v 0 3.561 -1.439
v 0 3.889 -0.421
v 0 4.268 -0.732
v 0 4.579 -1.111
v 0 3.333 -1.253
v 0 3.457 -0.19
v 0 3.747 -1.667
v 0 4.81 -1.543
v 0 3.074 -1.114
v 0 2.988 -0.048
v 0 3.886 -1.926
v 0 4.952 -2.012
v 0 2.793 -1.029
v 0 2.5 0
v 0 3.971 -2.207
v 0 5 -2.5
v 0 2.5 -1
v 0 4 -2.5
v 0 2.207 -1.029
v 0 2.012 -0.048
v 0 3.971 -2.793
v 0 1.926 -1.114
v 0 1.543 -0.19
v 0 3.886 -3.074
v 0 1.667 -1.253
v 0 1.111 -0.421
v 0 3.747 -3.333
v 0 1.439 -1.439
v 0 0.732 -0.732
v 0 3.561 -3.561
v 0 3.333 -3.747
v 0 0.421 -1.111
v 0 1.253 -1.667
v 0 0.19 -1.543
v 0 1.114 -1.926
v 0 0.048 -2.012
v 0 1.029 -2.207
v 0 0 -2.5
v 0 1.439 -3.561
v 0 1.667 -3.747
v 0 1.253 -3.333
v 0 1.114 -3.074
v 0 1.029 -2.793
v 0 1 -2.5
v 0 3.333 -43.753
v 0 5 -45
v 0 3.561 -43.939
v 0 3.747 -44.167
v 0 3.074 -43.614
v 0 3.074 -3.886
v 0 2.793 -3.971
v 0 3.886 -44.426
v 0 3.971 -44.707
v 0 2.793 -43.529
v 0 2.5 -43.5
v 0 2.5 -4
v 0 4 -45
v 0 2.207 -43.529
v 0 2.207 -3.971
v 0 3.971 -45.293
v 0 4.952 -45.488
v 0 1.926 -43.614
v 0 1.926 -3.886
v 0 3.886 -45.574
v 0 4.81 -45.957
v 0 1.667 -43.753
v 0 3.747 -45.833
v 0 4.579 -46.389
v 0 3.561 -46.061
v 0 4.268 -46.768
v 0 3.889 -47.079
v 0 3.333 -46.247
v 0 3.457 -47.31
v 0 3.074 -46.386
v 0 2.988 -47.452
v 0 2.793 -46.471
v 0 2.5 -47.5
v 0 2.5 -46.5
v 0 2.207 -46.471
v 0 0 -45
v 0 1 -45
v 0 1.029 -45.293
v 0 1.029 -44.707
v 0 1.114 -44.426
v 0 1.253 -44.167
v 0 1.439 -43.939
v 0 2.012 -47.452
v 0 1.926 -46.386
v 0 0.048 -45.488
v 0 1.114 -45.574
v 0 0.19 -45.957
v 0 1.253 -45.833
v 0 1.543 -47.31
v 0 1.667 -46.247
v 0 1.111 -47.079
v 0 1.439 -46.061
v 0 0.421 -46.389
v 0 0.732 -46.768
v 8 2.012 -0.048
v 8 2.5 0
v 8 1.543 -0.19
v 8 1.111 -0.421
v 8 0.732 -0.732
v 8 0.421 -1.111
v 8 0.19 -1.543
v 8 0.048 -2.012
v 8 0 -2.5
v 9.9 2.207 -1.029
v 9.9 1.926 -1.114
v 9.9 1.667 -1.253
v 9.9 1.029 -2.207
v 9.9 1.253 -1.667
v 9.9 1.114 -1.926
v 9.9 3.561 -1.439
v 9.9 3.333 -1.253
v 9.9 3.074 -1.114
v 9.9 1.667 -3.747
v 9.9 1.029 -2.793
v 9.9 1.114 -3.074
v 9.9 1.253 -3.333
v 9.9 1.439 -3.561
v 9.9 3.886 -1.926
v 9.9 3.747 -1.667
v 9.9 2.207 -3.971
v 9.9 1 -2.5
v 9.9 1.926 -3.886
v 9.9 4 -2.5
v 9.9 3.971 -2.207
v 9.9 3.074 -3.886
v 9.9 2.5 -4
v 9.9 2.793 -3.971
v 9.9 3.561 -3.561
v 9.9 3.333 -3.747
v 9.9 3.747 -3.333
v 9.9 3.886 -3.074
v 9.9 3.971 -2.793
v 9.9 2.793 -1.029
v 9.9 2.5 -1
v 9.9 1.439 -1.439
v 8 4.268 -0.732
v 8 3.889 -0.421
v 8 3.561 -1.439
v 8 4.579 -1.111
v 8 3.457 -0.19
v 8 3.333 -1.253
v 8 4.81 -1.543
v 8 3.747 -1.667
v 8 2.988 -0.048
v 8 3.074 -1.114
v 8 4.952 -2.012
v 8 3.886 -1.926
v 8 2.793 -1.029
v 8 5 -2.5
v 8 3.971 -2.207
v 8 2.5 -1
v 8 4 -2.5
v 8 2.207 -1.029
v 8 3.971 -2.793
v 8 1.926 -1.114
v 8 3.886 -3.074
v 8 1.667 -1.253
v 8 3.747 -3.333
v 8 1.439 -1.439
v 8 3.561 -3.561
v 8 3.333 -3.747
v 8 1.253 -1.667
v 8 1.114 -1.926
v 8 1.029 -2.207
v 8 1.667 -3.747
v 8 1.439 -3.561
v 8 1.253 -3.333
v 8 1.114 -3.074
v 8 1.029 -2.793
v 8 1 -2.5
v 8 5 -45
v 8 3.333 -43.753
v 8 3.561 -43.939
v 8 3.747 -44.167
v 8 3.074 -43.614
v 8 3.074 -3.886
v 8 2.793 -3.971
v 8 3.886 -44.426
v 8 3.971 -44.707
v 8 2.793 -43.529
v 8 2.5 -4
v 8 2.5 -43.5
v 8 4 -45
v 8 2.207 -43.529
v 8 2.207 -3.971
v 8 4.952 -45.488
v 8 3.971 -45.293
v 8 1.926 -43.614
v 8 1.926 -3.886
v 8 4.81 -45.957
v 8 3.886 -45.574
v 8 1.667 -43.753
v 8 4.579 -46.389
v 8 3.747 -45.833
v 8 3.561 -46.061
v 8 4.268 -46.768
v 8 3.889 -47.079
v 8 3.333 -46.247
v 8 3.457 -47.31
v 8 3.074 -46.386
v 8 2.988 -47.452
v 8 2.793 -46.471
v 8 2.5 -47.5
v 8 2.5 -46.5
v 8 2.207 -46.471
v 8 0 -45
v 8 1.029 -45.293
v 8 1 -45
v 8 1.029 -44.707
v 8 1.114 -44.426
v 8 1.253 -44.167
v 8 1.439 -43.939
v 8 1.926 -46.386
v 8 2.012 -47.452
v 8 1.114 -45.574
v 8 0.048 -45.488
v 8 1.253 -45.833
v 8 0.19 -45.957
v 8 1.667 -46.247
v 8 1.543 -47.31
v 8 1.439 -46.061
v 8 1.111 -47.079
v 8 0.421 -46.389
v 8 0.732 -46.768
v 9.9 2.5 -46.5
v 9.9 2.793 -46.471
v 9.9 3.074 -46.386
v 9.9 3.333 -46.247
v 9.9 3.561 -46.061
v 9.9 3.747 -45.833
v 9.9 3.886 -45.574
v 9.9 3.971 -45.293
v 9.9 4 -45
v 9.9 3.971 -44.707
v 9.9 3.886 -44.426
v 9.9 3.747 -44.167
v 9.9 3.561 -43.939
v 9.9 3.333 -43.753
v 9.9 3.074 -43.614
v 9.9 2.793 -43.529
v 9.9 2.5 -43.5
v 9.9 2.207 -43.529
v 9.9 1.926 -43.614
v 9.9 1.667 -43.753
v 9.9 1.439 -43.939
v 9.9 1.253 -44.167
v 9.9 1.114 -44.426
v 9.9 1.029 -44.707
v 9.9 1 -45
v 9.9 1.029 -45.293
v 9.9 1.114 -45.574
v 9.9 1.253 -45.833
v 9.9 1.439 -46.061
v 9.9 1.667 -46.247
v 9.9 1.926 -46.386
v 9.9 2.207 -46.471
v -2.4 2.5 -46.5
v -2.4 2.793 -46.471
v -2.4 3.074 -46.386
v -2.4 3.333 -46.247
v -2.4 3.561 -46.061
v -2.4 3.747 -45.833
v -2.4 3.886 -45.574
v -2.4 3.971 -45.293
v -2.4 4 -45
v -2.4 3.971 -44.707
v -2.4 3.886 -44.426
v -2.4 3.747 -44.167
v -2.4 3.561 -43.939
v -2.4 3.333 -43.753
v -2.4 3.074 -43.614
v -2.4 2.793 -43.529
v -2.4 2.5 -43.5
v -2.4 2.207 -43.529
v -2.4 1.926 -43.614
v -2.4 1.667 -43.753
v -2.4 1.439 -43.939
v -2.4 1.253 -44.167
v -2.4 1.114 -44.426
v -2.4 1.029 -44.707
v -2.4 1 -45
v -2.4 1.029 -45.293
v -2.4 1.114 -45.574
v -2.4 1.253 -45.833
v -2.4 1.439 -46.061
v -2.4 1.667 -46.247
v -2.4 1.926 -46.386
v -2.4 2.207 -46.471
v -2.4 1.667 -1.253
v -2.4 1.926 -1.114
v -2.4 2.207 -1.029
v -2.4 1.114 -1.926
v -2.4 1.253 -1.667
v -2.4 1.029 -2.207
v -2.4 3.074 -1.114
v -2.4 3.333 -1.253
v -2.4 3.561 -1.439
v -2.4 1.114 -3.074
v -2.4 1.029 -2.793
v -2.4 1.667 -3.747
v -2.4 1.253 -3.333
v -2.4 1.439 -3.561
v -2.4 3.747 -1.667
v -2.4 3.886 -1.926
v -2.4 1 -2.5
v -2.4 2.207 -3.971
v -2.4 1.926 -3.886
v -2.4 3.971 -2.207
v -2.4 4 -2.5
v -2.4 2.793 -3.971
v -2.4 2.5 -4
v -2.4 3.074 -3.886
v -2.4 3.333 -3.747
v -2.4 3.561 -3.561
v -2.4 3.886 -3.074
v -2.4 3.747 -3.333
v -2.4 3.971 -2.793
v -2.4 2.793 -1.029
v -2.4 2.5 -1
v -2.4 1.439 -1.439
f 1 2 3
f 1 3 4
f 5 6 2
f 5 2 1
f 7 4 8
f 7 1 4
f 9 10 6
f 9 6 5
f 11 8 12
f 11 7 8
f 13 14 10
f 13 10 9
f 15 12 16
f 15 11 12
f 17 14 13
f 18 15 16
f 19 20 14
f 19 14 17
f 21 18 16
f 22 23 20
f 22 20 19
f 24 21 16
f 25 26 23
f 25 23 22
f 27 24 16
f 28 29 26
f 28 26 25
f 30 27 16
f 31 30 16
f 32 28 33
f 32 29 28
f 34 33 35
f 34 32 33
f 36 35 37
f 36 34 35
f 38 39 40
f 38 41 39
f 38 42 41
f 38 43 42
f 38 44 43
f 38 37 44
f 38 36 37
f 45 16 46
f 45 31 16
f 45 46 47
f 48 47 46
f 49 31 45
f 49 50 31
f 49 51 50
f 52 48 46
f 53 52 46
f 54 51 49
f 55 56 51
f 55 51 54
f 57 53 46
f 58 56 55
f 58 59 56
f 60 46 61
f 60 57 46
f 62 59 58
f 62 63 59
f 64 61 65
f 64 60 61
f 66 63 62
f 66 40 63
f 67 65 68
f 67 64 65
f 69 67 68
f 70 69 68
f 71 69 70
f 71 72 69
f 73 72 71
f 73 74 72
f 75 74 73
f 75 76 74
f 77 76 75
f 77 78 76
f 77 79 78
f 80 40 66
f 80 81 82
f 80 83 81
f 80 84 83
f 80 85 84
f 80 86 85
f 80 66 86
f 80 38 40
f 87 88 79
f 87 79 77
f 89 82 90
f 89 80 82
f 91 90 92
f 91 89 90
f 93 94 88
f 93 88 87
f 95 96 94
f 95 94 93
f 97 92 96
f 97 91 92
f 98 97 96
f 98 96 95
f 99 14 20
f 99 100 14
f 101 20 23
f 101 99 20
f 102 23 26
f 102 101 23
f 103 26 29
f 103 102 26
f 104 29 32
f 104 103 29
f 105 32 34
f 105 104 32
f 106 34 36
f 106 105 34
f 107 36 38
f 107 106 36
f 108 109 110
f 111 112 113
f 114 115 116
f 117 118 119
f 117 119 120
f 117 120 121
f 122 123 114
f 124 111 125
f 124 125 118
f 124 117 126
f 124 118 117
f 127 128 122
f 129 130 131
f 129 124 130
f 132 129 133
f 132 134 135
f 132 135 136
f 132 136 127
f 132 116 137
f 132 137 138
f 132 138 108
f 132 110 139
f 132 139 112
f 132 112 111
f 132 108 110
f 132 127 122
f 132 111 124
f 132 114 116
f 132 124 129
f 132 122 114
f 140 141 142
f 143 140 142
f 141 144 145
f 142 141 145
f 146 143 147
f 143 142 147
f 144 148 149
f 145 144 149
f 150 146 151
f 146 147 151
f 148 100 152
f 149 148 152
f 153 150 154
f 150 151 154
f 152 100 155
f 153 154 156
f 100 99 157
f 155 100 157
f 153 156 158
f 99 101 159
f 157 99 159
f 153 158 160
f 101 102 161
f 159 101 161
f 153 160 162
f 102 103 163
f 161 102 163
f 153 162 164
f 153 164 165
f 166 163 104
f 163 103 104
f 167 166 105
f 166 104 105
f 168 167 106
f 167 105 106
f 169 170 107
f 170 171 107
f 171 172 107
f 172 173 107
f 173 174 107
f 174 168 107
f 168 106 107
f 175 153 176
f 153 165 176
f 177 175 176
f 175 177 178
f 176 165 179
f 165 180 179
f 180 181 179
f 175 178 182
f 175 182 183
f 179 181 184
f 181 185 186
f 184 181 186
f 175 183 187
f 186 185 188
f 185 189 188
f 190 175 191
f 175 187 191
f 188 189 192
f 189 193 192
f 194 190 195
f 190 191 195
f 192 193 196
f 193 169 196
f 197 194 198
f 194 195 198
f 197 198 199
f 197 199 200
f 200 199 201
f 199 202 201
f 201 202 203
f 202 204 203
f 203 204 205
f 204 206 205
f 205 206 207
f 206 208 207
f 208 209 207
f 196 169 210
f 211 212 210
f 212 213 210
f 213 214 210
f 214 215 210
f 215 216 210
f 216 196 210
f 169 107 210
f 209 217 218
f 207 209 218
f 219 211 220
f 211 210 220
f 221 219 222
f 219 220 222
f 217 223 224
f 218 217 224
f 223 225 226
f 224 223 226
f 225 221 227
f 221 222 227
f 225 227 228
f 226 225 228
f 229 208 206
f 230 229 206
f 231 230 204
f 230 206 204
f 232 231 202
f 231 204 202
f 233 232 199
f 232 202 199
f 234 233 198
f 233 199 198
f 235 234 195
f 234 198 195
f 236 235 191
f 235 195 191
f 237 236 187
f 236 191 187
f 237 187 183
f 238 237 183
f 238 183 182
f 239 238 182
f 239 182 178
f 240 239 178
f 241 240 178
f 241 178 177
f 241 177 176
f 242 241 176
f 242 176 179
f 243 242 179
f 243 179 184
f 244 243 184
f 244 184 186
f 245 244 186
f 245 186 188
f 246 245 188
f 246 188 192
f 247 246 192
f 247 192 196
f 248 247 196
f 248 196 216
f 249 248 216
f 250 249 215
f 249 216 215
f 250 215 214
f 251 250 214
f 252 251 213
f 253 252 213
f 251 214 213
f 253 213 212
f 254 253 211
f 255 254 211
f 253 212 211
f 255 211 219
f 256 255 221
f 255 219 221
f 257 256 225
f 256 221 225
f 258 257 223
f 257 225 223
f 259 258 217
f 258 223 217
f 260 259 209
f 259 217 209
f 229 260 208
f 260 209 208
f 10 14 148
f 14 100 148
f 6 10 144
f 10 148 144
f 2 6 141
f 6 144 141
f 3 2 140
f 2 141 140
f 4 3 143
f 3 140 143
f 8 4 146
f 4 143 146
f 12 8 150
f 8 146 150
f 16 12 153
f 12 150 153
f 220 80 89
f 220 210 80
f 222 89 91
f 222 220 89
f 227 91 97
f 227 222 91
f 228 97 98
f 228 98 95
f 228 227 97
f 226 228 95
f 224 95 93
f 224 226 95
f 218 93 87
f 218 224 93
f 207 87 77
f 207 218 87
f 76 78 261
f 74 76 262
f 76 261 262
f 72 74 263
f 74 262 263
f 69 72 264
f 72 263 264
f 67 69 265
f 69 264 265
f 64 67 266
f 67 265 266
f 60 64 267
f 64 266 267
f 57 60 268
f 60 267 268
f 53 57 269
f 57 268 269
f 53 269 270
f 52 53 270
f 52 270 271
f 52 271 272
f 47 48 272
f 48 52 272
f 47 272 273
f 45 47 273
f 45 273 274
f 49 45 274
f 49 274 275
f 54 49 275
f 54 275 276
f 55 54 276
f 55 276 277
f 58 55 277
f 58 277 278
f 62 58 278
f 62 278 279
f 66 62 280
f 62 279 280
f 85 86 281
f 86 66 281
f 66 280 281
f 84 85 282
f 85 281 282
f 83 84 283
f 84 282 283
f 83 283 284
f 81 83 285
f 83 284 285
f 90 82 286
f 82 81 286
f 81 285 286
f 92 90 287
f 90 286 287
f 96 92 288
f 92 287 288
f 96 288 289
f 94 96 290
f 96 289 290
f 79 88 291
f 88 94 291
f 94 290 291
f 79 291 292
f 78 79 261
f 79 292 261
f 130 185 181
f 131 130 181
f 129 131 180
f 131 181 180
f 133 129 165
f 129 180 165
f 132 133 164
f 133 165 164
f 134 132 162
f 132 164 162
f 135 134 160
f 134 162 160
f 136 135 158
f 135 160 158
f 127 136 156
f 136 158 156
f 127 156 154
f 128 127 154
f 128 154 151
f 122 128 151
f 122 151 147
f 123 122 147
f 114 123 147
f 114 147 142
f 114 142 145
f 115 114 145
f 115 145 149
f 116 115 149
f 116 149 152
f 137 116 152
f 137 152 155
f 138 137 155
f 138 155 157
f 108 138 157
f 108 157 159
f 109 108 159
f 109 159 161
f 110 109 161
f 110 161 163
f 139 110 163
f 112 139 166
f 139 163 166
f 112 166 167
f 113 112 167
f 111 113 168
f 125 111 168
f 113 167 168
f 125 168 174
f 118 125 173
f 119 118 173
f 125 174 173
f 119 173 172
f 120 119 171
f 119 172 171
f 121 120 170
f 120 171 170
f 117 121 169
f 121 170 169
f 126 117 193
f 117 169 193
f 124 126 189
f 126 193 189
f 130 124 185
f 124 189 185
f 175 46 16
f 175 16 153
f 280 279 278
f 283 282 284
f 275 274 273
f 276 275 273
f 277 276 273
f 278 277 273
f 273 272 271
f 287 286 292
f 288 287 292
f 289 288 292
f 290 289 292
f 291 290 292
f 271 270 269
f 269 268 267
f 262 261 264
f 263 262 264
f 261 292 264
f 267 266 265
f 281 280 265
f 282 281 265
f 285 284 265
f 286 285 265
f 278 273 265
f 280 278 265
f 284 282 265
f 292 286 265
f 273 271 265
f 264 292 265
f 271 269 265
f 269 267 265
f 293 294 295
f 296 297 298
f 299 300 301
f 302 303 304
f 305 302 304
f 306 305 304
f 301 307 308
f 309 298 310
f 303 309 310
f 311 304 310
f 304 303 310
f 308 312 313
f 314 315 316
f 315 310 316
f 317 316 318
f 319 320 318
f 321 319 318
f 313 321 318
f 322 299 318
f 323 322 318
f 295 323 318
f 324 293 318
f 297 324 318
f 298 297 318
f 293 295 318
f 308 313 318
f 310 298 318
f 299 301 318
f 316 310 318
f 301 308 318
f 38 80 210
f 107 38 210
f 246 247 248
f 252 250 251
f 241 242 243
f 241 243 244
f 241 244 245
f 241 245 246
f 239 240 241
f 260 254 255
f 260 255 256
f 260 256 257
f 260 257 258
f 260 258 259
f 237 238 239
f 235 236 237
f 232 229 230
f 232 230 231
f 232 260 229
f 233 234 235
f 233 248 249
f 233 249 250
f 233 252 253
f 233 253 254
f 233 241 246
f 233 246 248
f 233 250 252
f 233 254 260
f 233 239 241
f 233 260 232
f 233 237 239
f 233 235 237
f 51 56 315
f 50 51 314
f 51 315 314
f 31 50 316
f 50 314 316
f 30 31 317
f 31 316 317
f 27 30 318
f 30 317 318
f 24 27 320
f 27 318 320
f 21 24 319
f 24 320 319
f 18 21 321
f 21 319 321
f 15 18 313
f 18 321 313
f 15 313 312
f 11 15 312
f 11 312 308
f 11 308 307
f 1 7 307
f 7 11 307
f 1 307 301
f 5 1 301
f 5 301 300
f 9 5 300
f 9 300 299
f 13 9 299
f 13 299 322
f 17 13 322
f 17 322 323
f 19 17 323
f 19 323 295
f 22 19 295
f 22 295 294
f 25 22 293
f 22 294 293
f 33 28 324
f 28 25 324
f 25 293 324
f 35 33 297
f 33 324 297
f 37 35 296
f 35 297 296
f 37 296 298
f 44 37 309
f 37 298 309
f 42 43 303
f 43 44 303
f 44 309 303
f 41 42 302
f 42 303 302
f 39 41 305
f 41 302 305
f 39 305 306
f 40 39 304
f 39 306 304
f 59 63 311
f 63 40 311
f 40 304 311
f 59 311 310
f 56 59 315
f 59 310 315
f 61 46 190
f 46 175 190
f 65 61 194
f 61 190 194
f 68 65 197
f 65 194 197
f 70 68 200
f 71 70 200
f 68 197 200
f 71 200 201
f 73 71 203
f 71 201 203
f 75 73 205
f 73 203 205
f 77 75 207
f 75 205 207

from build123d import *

# Parameters (mm, degrees)
SKETCH1_W                = 8
SKETCH1_H                = 47.5
BOSS_EXTRUDE1_DEPTH      = 5
BOSS_EXTRUDE2_DEPTH      = 1.9
BOSS_EXTRUDE2_DEPTH_BACK = 10.4
SKETCH2_R                = 1.5
FILLET1_R                = 2.5


with BuildPart() as part:
    # Sketch1 → Boss-Extrude1 (new body)
    with BuildSketch(Plane(origin=(0, 0, 0), x_dir=(1, 0, 0), z_dir=(0, 1, 0))):
        with Locations((4, 23.75)):
            Rectangle(SKETCH1_W, SKETCH1_H)
    extrude(amount=BOSS_EXTRUDE1_DEPTH)

    # Sketch2 → Boss-Extrude2 (add, two sides: drawn at the far end of the back side and taken through both)
    with BuildSketch(Plane(origin=(8, 0, 0), x_dir=(0, 0, -1), z_dir=(1, 0, 0)).offset(-BOSS_EXTRUDE2_DEPTH_BACK)):
        with Locations((2.5, 2.5)):
            Circle(SKETCH2_R)
        with Locations((45, 2.5)):
            Circle(SKETCH2_R)
    extrude(amount=BOSS_EXTRUDE2_DEPTH + BOSS_EXTRUDE2_DEPTH_BACK)

    # Fillet1
    fillet1_edges = [part.edges().sort_by_distance(p)[0] for p in [
        (4, 0, -47.5),
        (4, 5, -47.5),
        (4, 0, 0),
        (4, 5, 0),
    ]]
    fillet(fillet1_edges, radius=FILLET1_R - 0.0001)  # a hair under: the kernel refuses the full size


solid = part.part
